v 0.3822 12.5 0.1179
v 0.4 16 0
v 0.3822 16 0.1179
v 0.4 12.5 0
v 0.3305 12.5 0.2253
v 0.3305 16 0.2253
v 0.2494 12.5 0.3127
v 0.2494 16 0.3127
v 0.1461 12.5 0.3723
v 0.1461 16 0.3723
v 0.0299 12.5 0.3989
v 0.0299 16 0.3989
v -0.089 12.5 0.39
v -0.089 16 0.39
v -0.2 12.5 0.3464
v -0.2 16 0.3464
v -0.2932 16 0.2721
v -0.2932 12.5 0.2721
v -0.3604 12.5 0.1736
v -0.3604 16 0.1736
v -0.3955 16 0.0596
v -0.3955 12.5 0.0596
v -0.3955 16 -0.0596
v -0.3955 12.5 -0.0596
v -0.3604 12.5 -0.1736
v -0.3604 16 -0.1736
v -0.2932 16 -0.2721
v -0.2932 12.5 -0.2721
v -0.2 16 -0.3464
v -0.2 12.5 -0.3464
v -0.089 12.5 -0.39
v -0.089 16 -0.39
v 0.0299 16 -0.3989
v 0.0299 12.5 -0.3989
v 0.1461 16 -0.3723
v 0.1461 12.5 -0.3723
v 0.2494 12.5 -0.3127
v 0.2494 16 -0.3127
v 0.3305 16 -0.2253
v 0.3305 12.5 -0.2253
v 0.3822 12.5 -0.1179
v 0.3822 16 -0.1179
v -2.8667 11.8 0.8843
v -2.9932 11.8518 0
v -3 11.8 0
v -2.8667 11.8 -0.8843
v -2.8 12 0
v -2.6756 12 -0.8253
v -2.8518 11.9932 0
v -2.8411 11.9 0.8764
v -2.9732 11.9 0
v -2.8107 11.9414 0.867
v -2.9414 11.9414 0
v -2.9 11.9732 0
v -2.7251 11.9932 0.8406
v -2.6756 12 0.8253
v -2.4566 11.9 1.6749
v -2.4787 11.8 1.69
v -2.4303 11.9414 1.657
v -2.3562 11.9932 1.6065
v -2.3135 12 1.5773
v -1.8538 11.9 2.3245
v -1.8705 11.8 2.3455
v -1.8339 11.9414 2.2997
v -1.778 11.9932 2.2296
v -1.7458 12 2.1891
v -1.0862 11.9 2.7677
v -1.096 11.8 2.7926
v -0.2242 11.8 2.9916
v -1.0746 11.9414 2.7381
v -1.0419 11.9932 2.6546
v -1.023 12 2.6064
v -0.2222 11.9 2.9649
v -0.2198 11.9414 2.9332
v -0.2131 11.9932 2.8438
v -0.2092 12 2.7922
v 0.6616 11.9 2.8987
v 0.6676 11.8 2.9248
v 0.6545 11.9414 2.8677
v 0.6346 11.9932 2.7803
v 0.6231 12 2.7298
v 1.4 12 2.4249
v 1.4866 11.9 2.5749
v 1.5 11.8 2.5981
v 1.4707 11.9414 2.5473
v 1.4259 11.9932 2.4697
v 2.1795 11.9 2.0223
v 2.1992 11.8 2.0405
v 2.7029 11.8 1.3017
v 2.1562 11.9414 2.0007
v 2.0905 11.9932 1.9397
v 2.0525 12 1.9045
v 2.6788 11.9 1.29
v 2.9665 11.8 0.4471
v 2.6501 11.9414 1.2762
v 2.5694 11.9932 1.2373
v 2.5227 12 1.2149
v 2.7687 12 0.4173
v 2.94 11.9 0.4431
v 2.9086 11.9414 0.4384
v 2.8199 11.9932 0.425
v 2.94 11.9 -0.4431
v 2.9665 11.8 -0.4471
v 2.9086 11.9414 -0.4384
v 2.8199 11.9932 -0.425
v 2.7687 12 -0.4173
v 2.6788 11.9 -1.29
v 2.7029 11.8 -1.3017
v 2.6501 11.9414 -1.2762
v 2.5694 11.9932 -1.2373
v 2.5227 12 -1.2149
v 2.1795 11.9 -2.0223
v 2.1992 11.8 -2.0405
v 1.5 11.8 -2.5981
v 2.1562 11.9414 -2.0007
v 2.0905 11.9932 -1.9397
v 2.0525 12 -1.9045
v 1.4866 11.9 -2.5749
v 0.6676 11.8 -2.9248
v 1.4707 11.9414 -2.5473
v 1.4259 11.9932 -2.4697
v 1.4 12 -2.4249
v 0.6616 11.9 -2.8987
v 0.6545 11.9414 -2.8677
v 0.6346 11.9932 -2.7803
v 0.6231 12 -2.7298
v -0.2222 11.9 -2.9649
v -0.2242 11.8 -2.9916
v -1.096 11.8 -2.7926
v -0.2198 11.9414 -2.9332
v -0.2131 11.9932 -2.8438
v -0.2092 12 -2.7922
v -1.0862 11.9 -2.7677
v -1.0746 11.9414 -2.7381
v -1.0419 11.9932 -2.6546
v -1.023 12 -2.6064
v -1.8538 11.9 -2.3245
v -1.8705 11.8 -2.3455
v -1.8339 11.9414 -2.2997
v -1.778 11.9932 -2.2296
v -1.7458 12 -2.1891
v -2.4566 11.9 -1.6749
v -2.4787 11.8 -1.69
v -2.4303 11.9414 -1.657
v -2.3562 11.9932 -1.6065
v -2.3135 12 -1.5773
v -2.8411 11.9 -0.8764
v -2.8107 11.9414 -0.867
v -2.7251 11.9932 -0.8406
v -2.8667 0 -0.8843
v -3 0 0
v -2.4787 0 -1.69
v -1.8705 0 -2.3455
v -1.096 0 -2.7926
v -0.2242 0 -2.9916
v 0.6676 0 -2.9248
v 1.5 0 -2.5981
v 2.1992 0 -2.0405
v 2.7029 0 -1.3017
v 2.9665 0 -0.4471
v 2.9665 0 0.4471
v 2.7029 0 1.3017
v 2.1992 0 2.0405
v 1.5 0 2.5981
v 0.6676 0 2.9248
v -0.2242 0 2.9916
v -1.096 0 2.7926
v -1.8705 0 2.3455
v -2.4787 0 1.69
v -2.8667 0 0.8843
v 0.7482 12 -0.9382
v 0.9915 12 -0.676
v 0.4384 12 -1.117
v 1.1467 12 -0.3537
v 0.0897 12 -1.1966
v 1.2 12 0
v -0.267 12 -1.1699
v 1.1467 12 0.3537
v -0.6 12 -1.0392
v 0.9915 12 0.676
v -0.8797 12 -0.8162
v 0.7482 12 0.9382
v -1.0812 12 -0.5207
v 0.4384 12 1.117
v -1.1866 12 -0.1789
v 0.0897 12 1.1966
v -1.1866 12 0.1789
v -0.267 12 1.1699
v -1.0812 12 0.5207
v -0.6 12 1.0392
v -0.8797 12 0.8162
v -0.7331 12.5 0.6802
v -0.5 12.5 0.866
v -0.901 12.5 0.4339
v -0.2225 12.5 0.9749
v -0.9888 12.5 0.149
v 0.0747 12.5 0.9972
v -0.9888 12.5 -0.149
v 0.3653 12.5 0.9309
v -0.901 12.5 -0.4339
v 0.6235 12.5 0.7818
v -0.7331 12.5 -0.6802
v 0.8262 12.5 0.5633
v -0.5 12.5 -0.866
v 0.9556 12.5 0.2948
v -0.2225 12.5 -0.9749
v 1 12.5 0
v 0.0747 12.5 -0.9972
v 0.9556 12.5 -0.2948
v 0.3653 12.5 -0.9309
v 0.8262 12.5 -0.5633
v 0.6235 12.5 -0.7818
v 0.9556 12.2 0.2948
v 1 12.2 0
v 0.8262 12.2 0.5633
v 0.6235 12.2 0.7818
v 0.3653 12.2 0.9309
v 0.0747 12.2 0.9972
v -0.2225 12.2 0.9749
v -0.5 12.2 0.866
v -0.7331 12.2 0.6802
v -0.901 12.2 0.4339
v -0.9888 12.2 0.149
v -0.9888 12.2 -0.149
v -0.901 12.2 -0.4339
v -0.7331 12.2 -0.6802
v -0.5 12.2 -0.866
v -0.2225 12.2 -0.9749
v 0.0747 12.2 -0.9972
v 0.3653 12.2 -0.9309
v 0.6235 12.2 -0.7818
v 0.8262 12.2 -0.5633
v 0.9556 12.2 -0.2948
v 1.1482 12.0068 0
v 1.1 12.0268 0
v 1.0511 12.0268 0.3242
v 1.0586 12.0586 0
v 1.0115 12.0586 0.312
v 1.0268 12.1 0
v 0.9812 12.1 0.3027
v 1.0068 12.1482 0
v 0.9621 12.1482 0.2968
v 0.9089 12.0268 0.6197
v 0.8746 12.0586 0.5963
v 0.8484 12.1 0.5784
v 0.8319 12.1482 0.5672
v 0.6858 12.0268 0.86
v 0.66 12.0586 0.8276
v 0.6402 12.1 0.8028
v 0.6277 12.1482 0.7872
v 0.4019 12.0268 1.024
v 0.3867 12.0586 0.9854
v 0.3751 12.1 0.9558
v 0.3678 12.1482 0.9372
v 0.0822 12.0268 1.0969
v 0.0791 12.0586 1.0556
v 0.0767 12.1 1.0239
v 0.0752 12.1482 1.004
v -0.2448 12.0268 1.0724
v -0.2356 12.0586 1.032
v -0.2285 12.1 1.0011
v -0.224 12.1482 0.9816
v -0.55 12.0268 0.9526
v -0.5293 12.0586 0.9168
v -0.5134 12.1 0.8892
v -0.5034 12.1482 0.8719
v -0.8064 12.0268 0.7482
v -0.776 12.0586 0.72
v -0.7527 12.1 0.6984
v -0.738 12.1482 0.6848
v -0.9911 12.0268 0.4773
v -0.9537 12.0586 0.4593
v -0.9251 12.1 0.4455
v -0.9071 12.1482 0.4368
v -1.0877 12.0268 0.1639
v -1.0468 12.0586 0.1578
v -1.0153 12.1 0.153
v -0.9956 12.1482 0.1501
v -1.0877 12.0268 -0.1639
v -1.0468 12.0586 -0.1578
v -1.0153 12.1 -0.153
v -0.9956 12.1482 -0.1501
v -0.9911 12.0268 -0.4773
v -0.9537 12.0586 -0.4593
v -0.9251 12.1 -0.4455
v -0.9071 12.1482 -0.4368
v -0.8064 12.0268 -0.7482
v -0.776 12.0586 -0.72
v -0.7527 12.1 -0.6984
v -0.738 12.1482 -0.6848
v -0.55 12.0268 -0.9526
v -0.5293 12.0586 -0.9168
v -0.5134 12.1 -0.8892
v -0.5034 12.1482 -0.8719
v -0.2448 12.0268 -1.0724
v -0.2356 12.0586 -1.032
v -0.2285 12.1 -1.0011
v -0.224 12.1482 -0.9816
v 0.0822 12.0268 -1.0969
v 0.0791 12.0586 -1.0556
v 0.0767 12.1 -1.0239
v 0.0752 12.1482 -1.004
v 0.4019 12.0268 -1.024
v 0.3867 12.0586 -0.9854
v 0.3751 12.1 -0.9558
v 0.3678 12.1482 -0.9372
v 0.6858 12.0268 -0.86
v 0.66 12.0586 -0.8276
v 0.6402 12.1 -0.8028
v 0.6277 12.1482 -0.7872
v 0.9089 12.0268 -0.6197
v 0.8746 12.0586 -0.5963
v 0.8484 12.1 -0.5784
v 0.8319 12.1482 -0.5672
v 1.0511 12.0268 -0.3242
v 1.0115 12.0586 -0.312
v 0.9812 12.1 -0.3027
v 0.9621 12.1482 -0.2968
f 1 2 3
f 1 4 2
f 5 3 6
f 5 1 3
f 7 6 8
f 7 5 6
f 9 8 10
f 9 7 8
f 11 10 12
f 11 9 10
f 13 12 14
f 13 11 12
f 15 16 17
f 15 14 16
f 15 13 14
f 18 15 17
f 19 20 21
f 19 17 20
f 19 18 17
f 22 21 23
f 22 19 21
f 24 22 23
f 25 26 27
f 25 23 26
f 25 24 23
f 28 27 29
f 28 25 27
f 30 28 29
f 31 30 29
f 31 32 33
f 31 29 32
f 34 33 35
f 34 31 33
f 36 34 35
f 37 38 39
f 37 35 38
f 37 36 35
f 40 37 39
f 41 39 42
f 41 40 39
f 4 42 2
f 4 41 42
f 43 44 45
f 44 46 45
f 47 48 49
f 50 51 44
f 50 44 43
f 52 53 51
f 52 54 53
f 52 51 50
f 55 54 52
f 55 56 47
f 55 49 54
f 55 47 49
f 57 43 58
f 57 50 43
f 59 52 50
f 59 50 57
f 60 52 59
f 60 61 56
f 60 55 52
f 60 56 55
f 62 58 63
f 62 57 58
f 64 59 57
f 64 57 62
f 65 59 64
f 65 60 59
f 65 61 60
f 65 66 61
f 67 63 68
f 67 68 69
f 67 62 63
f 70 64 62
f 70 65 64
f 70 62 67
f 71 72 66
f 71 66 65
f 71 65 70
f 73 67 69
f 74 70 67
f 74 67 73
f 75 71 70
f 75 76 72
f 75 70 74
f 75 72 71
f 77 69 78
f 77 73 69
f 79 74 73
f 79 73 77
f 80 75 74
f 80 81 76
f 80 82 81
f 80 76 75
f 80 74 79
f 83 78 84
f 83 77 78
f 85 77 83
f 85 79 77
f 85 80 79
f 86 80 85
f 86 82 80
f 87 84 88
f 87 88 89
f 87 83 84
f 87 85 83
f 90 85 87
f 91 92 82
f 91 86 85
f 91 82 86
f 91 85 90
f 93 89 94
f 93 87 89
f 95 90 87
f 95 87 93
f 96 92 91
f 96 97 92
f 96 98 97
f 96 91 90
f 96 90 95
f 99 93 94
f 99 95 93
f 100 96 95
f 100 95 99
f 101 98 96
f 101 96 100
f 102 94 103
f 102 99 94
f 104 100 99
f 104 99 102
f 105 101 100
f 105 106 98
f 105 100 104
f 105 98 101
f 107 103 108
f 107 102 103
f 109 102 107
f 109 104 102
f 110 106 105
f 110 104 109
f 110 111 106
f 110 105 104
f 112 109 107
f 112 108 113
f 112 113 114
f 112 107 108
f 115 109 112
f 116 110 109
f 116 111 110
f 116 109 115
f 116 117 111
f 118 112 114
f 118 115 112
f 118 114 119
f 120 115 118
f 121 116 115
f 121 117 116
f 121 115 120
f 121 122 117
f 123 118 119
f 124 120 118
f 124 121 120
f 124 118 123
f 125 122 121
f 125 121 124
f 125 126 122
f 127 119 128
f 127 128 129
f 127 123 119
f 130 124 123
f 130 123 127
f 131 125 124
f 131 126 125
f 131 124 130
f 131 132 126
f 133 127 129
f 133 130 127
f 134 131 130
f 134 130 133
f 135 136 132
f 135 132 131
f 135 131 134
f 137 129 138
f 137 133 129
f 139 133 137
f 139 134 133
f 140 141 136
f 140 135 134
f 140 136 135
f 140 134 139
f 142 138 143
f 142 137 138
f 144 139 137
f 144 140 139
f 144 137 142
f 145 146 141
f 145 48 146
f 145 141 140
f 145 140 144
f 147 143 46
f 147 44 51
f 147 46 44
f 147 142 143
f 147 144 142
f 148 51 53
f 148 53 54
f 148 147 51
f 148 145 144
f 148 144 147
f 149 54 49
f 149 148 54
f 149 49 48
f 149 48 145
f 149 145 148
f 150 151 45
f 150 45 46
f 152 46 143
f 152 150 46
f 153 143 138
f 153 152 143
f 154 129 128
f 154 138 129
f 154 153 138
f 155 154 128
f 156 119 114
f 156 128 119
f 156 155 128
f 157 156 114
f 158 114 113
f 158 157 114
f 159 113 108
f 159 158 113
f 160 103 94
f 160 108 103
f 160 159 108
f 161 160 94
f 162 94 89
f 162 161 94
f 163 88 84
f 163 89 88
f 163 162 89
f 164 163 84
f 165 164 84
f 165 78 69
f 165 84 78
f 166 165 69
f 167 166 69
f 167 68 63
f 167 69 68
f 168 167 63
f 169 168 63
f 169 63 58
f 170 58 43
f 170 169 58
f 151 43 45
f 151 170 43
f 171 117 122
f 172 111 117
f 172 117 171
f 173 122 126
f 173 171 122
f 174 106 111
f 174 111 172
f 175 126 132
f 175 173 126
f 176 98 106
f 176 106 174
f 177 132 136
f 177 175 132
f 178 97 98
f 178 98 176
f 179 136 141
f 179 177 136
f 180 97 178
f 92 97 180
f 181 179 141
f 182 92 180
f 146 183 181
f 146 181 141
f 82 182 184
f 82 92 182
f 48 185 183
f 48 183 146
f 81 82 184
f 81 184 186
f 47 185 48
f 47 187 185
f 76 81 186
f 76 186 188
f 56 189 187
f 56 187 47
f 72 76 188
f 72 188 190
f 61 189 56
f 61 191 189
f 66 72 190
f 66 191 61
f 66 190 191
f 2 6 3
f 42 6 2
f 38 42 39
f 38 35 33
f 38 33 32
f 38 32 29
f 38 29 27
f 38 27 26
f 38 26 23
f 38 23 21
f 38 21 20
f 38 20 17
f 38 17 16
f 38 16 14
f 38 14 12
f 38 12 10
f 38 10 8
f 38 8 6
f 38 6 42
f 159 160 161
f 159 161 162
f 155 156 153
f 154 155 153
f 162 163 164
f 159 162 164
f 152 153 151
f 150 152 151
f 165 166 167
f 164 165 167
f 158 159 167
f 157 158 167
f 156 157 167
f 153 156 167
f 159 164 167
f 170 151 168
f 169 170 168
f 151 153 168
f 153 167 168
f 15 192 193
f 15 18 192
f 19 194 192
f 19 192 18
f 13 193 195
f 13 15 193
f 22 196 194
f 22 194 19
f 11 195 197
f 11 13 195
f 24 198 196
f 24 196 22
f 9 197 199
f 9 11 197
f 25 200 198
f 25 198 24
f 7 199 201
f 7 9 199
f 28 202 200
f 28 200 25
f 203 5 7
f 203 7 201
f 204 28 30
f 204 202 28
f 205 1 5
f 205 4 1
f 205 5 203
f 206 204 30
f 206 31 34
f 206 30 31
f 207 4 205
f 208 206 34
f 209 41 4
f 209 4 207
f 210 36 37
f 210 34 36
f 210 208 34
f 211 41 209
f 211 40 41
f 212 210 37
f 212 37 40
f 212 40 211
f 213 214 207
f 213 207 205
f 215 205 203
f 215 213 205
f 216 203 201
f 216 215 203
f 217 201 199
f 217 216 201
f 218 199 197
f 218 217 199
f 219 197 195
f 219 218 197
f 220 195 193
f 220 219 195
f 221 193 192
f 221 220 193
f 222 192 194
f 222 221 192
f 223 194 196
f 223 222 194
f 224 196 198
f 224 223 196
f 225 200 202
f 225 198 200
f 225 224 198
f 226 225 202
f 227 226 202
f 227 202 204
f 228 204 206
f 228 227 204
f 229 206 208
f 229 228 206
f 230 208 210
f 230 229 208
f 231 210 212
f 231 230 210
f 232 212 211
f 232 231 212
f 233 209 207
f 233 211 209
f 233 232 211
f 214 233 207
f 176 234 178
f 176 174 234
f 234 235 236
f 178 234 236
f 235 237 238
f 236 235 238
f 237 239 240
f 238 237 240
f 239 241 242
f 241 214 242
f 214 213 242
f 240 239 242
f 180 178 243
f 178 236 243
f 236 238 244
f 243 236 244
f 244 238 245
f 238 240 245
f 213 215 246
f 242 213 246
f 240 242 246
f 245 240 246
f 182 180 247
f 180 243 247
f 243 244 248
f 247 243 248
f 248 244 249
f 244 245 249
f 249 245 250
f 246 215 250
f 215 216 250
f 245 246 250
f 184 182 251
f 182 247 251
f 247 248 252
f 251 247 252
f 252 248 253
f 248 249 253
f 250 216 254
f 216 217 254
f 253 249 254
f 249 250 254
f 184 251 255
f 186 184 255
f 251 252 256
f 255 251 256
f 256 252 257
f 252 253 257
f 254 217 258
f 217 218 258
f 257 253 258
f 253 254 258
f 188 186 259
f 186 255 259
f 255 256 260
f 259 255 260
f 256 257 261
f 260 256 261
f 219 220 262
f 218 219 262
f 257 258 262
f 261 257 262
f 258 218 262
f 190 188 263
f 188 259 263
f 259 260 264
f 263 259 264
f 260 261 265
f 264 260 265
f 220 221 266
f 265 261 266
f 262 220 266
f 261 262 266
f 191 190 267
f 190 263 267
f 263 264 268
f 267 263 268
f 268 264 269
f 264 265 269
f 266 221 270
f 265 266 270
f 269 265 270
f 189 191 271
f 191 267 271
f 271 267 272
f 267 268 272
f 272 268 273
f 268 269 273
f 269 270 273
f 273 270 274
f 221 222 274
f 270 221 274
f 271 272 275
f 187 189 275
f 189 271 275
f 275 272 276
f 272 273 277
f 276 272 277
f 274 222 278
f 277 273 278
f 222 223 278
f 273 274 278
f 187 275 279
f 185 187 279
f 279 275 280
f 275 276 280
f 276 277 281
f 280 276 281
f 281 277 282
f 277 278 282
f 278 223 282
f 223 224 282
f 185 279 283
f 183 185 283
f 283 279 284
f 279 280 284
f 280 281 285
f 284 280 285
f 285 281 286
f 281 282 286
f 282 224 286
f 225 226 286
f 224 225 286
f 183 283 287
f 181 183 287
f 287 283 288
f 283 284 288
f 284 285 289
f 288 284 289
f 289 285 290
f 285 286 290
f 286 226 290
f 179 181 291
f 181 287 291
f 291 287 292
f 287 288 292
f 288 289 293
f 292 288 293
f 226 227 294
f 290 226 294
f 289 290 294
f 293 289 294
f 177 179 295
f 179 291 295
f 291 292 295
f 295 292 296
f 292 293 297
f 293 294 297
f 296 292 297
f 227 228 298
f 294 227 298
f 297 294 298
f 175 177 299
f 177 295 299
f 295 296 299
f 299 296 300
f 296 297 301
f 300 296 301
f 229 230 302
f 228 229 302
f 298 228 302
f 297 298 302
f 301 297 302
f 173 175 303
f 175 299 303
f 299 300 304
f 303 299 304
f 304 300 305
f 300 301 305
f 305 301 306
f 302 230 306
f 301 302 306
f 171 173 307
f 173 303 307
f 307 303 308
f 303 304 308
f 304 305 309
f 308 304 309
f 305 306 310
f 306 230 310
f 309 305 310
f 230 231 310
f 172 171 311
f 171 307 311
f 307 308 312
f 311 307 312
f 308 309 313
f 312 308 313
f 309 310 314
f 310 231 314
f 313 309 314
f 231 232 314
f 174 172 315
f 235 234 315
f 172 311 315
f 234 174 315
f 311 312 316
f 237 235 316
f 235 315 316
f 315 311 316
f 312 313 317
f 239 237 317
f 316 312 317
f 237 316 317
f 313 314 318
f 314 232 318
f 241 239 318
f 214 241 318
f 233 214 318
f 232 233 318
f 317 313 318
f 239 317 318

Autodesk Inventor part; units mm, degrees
ref_plane "YZ Plane" through (0, 0, 0) normal (1, 0, 0) x (0, 1, 0)
ref_plane "XZ Plane" through (0, 0, 0) normal (0, 1, 0) x (-1, 0, 0)
sketch "スケッチ1" plane through (0, 0, 0) normal (0, 1, 0) x (-1, 0, 0)
  circle A0 centre (0, 0) radius 3
  dimension "d0" = 6
extrude "押し出し1" add sketch "スケッチ1" along normal blind 12
sketch "スケッチ4" plane through (0, 12, 0) normal (0, 1, 0) x (1, 0, 0)
  circle A0 centre (0, 0) radius 1
  dimension "d7" = 2
extrude "押し出し4" add sketch "スケッチ4" along normal blind 0.5
fillet "フィレット1" radius 0.2 2 edges at (-1, 12, 0) (3, 12, 0)
ref_plane "作業平面1" through (0, 0.5, 0) normal (0, -1, 0) x (1, 0, 0)
split_face "分割1"
sketch "スケッチ6" plane through (0, 12.5, 0) normal (0, 1, 0) x (1, 0, 0)
  circle A0 centre (0, 0) radius 0.4
  dimension "d12" = 0.8
extrude "押し出し5" add sketch "スケッチ6" along normal blind 3.5
properties part number "CoreLessMotor"
